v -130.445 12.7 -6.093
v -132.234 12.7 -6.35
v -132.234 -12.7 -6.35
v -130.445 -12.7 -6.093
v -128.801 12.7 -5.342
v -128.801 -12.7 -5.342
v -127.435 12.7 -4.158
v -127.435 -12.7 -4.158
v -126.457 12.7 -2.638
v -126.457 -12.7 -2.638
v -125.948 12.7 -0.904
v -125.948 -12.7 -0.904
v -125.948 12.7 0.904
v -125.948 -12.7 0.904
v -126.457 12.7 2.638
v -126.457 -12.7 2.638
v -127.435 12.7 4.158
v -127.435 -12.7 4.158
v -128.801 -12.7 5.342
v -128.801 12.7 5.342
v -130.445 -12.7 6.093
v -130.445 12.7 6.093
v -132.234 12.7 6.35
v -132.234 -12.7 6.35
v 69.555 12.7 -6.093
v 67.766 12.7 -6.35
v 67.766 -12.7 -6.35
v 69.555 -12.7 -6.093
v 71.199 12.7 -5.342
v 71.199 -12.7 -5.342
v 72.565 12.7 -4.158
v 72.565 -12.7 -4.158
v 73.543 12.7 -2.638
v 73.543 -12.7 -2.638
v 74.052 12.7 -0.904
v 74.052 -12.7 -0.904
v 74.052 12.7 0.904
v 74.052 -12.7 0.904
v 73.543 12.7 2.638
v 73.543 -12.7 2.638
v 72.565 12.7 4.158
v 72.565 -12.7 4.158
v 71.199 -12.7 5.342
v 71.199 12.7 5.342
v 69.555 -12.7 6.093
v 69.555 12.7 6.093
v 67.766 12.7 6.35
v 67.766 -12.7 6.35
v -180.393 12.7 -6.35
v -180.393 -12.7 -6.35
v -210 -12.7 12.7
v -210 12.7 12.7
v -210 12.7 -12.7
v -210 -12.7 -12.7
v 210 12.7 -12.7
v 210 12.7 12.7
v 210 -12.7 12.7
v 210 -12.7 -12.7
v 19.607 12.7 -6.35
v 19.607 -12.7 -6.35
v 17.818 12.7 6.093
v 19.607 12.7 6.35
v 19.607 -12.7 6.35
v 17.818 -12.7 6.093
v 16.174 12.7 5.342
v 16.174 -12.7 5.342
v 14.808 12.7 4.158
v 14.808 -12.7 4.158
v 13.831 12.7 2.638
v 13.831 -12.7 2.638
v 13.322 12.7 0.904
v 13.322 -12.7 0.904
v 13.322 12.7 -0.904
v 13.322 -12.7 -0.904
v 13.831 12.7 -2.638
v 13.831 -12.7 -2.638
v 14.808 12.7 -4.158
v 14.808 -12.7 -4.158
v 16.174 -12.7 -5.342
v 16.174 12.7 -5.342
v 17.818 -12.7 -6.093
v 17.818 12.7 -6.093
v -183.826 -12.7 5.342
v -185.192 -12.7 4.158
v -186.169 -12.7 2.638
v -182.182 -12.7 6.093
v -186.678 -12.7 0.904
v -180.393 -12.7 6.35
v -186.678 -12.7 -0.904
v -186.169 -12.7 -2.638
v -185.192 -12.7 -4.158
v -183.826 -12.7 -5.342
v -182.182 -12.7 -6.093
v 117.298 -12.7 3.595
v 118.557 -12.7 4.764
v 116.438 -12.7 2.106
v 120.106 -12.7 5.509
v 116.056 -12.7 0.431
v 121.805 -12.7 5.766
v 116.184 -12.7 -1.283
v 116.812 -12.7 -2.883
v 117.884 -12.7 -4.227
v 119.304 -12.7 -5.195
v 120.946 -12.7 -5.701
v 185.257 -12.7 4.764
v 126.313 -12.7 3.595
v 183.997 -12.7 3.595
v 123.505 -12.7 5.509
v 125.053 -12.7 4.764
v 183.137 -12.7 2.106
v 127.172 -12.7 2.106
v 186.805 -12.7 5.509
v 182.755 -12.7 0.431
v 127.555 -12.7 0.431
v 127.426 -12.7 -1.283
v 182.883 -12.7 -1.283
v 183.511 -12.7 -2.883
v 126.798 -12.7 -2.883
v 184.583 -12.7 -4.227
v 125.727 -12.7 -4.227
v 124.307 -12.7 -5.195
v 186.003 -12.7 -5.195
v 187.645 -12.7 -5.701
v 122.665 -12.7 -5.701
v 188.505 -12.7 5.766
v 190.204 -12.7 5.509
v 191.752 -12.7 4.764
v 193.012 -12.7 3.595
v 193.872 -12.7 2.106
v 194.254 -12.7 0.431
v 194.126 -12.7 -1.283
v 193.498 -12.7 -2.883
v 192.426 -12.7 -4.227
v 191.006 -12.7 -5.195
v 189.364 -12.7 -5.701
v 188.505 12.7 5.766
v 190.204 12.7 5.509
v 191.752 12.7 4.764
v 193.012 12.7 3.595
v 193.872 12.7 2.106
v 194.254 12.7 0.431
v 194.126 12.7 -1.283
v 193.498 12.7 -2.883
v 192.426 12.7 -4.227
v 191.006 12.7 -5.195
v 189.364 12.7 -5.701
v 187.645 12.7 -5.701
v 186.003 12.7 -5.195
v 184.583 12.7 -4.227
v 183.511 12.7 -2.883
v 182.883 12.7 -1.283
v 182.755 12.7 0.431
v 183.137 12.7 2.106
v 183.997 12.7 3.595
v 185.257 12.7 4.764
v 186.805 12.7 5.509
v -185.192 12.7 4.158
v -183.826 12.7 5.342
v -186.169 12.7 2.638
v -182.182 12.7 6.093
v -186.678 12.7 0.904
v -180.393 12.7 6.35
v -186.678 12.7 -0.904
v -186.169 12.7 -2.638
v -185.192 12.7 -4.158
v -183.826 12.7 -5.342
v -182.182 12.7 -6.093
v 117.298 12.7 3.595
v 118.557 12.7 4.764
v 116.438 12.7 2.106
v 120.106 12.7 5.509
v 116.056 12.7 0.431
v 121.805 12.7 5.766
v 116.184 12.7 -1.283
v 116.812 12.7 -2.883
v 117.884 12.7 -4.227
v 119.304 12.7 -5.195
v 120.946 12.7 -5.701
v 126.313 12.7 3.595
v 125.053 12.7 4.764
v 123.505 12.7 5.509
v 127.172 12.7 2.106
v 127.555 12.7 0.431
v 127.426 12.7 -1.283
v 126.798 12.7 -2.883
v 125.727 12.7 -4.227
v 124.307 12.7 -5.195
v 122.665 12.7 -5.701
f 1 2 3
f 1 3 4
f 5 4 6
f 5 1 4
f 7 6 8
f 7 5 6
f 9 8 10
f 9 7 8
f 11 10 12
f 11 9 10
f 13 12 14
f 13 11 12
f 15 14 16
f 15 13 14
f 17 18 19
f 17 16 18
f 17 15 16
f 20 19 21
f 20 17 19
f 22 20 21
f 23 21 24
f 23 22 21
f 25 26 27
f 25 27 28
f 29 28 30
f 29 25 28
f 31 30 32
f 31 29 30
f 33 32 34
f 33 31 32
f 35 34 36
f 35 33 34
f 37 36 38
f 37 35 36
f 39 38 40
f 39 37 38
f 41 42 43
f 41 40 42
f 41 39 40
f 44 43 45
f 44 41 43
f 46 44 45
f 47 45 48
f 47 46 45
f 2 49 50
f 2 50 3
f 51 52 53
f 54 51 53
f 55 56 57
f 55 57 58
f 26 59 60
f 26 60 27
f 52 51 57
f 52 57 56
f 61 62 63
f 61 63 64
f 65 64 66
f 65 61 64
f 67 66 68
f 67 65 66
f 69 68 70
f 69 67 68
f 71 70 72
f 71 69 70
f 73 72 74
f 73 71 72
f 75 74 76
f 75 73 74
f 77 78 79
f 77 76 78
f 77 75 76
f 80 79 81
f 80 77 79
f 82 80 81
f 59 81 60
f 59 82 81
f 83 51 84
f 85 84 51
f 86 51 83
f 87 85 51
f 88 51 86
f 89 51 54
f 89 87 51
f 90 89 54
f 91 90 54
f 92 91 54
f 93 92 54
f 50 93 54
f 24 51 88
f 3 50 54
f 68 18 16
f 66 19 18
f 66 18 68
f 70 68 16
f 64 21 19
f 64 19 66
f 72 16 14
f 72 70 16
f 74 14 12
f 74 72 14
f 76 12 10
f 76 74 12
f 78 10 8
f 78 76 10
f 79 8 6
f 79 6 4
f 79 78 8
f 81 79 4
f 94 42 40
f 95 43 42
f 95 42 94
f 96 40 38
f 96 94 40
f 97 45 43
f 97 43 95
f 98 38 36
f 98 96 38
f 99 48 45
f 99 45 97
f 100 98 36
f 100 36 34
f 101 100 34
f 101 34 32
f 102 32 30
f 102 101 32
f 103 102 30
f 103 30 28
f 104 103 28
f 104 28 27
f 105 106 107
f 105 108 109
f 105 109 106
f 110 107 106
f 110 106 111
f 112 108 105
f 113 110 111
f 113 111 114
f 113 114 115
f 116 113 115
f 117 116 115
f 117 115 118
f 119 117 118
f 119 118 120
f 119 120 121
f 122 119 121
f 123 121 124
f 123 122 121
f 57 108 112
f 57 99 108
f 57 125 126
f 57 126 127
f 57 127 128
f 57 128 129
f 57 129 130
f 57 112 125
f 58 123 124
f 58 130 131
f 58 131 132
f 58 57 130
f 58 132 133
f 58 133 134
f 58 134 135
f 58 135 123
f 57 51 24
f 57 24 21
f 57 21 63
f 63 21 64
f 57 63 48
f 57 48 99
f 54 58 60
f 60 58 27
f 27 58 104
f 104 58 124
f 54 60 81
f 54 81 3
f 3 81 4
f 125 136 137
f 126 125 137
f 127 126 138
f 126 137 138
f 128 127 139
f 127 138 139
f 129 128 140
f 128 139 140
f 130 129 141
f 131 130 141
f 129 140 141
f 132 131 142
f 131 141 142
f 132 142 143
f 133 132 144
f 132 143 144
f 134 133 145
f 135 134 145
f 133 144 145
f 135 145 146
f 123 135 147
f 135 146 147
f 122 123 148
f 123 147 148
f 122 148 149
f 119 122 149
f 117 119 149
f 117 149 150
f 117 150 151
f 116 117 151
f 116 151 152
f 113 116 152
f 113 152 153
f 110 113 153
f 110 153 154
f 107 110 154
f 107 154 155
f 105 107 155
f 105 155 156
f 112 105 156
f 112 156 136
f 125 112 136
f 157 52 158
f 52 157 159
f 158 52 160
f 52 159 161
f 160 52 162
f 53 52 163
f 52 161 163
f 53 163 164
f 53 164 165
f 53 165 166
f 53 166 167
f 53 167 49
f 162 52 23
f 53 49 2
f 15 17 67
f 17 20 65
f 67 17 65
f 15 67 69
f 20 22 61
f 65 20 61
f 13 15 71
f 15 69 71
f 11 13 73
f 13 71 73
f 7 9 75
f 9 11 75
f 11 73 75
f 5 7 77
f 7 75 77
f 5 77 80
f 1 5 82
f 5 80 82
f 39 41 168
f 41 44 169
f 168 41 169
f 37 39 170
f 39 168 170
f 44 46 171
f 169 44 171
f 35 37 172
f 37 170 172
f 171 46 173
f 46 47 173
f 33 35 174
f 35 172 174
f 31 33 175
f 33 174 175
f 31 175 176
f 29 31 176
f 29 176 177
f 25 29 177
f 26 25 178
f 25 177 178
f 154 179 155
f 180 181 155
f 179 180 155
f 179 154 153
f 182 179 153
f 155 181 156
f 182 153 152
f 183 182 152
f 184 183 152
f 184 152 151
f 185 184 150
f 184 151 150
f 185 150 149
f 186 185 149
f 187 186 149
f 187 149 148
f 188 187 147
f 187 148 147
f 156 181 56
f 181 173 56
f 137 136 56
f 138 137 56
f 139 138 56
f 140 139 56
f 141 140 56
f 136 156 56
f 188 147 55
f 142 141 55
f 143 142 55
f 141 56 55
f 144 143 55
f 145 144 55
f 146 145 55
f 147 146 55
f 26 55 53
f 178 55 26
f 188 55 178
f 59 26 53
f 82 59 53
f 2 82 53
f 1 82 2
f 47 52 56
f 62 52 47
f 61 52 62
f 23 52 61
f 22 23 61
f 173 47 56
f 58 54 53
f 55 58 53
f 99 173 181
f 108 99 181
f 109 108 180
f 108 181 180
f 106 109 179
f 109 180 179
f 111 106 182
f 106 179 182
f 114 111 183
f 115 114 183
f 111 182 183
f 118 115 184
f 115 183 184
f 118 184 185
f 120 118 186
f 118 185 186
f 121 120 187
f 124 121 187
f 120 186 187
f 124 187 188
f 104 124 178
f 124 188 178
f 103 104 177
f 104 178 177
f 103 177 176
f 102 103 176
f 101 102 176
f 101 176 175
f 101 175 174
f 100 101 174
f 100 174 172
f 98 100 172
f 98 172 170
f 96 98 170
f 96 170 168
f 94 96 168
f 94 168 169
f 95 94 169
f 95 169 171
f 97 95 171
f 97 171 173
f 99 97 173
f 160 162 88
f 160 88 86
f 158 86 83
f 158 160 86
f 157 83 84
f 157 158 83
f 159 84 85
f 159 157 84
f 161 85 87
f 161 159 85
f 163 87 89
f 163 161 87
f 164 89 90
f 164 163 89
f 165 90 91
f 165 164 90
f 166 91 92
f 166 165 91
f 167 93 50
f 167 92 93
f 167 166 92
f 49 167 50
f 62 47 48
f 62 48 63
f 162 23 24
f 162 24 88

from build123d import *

# Parameters (mm, degrees)
CROQUIS2_W              = 25.4
CROQUIS2_H              = 25.4
SALIENTE_EXTRUIR1_DEPTH = 210
CROQUIS3_R              = 5.765627546
CORTAR_EXTRUIR1_DEPTH   = 212.911420174


with BuildPart() as part:
    # Croquis2 → Saliente-Extruir1 (new, symmetric)
    with BuildSketch(Plane(origin=(0, 0, 0), x_dir=(0, 0, -1), z_dir=(1, 0, 0))):
        Rectangle(CROQUIS2_W, CROQUIS2_H)
    extrude(amount=SALIENTE_EXTRUIR1_DEPTH, both=True)

    # Croquis3 → Cortar-Extruir1 (cut, through all)
    with BuildSketch(Plane(origin=(0, 12.7, 0), x_dir=(1, 0, 0), z_dir=(0, 1, 0))):
        with Locations(Location((121.805313166, 0, 0), (0, 0, 270))):
            Circle(CROQUIS3_R)
        with Locations(Location((188.504509996, 0, 0), (0, 0, 270))):
            Circle(CROQUIS3_R)
        with BuildLine():
            Line((-180.393059191, 6.35), (-132.233607082, 6.35))
            ThreePointArc((-132.233607082, 6.35), (-125.883607082, 0), (-132.233607082, -6.35))
            Line((-132.233607082, -6.35), (-180.393059191, -6.35))
            ThreePointArc((-180.393059191, -6.35), (-186.743059191, 0), (-180.393059191, 6.35))
        make_face()
        with BuildLine():
            Line((19.606940809, 6.35), (67.766392918, 6.35))
            ThreePointArc((67.766392918, 6.35), (74.116392918, 0), (67.766392918, -6.35))
            Line((67.766392918, -6.35), (19.606940809, -6.35))
            ThreePointArc((19.606940809, -6.35), (13.256940809, 0), (19.606940809, 6.35))
        make_face()
    extrude(amount=-CORTAR_EXTRUIR1_DEPTH, mode=Mode.SUBTRACT)


solid = part.part
